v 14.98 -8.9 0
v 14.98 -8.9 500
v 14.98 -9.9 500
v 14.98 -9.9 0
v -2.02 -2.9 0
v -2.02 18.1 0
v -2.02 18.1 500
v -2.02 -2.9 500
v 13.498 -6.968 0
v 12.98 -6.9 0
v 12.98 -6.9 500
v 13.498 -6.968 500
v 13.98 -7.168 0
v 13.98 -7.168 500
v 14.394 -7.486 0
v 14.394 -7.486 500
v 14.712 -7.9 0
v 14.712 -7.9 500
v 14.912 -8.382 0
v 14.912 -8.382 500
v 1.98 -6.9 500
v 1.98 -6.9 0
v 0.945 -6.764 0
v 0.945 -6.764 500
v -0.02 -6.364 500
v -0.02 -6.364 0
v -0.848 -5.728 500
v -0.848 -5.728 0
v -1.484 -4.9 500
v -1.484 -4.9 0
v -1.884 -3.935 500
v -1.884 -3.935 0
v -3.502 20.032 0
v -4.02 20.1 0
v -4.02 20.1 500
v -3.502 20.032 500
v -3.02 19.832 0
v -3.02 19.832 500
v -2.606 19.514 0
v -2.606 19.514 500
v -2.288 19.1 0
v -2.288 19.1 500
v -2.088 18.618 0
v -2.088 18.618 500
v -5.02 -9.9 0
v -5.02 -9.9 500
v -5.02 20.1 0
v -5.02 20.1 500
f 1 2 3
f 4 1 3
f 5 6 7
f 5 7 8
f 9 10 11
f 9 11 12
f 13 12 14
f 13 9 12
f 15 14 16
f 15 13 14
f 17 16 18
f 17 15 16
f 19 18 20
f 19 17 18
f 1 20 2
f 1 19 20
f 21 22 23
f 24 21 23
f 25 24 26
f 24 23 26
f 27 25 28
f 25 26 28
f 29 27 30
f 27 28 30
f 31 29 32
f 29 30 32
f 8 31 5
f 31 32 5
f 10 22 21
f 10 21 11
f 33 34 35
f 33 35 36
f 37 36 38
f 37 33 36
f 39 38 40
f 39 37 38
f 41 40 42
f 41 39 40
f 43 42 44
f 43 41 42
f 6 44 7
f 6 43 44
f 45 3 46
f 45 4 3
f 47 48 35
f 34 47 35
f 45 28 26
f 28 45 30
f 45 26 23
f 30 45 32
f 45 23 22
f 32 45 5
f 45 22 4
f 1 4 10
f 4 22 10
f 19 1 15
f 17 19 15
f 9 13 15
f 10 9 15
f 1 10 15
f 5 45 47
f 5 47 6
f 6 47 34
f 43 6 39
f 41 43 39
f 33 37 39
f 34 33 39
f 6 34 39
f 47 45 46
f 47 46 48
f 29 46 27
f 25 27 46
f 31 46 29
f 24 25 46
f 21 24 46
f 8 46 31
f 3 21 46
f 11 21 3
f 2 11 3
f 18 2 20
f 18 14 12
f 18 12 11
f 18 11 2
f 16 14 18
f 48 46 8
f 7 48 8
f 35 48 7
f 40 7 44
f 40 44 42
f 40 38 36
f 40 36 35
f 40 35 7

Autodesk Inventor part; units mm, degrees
ref_plane "YZ Plane" through (0, 0, 0) normal (1, 0, 0) x (0, 1, 0)
ref_plane "Start plane" through (0, 0, 0) normal (0, 0, 1) x (1, 0, 0)
ref_plane "End plane" through (0, 0, 1) normal (0, 0, 1) x (1, 0, 0)
sketch "Sketch2" plane through (0, 0, 0) normal (0, 0, 1) x (1, 0, 0)
  line L0 (-2.02, 18.1) -> (-2.02, -2.9)
  line L1 (-5.02, 20.1) -> (-4.02, 20.1)
  line L2 (-5.02, -9.9) -> (-5.02, 20.1)
  line L3 (14.98, -9.9) -> (-5.02, -9.9)
  line L4 (14.98, -8.9) -> (14.98, -9.9)
  line L5 (1.98, -6.9) -> (12.98, -6.9)
  arc A0 (-2.02, -2.9) -> (1.98, -6.9) centre (1.98, -2.9) ccw
  arc A1 (-2.02, 18.1) -> (-4.02, 20.1) centre (-4.02, 18.1) ccw
  arc A2 (14.98, -8.9) -> (12.98, -6.9) centre (12.98, -8.9) ccw
  line L6 (0, 26.5971) -> (0, -15.9828) construction
  line L7 (-9.1028, 0) -> (19.4771, 0) construction
  point P0 (-2.02, 20.1)
  point P1 (-2.02, -6.9)
  point P2 (14.98, -6.9)
  dimension "d4" = 20
  dimension "d6" = 30
  dimension "d8" = 3
  dimension "d10" = 3
  dimension "d17" = 4
  dimension "d18" = 2
  dimension "d19" = 9.9
  dimension "d20" = 5.02
extrude "Body" add sketch "Sketch2" along normal blind 500 from surface at 0
sketch "Sketch3" plane through (0, 0, 0) normal (0, 0, 1) x (1, 0, 0)
  line L0 (0, 0) -> (10, 0)
ref_plane "Work Plane10" through (0, 0, 0) normal (0, -1, 0) x (1, 0, 0)
sketch "Sketch4" plane through (0, 0, 0) normal (0, -1, 0) x (1, 0, 0)
  line L0 (-2, 0) -> (12, 0) projected
  line L1 (-2, 1) -> (12, 1) projected
  dimension "d24" = 1
equation "\"d4\" = b"
equation "\"d6\" = ParH"
equation "\"d8\" = ParT"
equation "\"d10\" = ParT"
equation "\"d17\" = R"
equation "\"d18\" = R1"
equation "\"d19\" = ex"
equation "\"d20\" = ey"
equation "\"b\" = 20"
equation "\"ParT\" = 3"
equation "\"R1\" = 2"
equation "\"G_L\" = d24"
equation "\"ParH\" = 30"
equation "\"R\" = 4"
equation "\"ey\" = 5.02"
equation "\"ex\" = 9.9"
equation "\"G_OFFSET_START\" = 0"
equation "\"G_OFFSET_END\" = 0"
equation "\"d22\" = G_OFFSET_END + B_L"
equation "\"B_L\" = 1"
properties part number "ISO 657-2 - 30x 20x 3-1" material "Steel, Mild"
